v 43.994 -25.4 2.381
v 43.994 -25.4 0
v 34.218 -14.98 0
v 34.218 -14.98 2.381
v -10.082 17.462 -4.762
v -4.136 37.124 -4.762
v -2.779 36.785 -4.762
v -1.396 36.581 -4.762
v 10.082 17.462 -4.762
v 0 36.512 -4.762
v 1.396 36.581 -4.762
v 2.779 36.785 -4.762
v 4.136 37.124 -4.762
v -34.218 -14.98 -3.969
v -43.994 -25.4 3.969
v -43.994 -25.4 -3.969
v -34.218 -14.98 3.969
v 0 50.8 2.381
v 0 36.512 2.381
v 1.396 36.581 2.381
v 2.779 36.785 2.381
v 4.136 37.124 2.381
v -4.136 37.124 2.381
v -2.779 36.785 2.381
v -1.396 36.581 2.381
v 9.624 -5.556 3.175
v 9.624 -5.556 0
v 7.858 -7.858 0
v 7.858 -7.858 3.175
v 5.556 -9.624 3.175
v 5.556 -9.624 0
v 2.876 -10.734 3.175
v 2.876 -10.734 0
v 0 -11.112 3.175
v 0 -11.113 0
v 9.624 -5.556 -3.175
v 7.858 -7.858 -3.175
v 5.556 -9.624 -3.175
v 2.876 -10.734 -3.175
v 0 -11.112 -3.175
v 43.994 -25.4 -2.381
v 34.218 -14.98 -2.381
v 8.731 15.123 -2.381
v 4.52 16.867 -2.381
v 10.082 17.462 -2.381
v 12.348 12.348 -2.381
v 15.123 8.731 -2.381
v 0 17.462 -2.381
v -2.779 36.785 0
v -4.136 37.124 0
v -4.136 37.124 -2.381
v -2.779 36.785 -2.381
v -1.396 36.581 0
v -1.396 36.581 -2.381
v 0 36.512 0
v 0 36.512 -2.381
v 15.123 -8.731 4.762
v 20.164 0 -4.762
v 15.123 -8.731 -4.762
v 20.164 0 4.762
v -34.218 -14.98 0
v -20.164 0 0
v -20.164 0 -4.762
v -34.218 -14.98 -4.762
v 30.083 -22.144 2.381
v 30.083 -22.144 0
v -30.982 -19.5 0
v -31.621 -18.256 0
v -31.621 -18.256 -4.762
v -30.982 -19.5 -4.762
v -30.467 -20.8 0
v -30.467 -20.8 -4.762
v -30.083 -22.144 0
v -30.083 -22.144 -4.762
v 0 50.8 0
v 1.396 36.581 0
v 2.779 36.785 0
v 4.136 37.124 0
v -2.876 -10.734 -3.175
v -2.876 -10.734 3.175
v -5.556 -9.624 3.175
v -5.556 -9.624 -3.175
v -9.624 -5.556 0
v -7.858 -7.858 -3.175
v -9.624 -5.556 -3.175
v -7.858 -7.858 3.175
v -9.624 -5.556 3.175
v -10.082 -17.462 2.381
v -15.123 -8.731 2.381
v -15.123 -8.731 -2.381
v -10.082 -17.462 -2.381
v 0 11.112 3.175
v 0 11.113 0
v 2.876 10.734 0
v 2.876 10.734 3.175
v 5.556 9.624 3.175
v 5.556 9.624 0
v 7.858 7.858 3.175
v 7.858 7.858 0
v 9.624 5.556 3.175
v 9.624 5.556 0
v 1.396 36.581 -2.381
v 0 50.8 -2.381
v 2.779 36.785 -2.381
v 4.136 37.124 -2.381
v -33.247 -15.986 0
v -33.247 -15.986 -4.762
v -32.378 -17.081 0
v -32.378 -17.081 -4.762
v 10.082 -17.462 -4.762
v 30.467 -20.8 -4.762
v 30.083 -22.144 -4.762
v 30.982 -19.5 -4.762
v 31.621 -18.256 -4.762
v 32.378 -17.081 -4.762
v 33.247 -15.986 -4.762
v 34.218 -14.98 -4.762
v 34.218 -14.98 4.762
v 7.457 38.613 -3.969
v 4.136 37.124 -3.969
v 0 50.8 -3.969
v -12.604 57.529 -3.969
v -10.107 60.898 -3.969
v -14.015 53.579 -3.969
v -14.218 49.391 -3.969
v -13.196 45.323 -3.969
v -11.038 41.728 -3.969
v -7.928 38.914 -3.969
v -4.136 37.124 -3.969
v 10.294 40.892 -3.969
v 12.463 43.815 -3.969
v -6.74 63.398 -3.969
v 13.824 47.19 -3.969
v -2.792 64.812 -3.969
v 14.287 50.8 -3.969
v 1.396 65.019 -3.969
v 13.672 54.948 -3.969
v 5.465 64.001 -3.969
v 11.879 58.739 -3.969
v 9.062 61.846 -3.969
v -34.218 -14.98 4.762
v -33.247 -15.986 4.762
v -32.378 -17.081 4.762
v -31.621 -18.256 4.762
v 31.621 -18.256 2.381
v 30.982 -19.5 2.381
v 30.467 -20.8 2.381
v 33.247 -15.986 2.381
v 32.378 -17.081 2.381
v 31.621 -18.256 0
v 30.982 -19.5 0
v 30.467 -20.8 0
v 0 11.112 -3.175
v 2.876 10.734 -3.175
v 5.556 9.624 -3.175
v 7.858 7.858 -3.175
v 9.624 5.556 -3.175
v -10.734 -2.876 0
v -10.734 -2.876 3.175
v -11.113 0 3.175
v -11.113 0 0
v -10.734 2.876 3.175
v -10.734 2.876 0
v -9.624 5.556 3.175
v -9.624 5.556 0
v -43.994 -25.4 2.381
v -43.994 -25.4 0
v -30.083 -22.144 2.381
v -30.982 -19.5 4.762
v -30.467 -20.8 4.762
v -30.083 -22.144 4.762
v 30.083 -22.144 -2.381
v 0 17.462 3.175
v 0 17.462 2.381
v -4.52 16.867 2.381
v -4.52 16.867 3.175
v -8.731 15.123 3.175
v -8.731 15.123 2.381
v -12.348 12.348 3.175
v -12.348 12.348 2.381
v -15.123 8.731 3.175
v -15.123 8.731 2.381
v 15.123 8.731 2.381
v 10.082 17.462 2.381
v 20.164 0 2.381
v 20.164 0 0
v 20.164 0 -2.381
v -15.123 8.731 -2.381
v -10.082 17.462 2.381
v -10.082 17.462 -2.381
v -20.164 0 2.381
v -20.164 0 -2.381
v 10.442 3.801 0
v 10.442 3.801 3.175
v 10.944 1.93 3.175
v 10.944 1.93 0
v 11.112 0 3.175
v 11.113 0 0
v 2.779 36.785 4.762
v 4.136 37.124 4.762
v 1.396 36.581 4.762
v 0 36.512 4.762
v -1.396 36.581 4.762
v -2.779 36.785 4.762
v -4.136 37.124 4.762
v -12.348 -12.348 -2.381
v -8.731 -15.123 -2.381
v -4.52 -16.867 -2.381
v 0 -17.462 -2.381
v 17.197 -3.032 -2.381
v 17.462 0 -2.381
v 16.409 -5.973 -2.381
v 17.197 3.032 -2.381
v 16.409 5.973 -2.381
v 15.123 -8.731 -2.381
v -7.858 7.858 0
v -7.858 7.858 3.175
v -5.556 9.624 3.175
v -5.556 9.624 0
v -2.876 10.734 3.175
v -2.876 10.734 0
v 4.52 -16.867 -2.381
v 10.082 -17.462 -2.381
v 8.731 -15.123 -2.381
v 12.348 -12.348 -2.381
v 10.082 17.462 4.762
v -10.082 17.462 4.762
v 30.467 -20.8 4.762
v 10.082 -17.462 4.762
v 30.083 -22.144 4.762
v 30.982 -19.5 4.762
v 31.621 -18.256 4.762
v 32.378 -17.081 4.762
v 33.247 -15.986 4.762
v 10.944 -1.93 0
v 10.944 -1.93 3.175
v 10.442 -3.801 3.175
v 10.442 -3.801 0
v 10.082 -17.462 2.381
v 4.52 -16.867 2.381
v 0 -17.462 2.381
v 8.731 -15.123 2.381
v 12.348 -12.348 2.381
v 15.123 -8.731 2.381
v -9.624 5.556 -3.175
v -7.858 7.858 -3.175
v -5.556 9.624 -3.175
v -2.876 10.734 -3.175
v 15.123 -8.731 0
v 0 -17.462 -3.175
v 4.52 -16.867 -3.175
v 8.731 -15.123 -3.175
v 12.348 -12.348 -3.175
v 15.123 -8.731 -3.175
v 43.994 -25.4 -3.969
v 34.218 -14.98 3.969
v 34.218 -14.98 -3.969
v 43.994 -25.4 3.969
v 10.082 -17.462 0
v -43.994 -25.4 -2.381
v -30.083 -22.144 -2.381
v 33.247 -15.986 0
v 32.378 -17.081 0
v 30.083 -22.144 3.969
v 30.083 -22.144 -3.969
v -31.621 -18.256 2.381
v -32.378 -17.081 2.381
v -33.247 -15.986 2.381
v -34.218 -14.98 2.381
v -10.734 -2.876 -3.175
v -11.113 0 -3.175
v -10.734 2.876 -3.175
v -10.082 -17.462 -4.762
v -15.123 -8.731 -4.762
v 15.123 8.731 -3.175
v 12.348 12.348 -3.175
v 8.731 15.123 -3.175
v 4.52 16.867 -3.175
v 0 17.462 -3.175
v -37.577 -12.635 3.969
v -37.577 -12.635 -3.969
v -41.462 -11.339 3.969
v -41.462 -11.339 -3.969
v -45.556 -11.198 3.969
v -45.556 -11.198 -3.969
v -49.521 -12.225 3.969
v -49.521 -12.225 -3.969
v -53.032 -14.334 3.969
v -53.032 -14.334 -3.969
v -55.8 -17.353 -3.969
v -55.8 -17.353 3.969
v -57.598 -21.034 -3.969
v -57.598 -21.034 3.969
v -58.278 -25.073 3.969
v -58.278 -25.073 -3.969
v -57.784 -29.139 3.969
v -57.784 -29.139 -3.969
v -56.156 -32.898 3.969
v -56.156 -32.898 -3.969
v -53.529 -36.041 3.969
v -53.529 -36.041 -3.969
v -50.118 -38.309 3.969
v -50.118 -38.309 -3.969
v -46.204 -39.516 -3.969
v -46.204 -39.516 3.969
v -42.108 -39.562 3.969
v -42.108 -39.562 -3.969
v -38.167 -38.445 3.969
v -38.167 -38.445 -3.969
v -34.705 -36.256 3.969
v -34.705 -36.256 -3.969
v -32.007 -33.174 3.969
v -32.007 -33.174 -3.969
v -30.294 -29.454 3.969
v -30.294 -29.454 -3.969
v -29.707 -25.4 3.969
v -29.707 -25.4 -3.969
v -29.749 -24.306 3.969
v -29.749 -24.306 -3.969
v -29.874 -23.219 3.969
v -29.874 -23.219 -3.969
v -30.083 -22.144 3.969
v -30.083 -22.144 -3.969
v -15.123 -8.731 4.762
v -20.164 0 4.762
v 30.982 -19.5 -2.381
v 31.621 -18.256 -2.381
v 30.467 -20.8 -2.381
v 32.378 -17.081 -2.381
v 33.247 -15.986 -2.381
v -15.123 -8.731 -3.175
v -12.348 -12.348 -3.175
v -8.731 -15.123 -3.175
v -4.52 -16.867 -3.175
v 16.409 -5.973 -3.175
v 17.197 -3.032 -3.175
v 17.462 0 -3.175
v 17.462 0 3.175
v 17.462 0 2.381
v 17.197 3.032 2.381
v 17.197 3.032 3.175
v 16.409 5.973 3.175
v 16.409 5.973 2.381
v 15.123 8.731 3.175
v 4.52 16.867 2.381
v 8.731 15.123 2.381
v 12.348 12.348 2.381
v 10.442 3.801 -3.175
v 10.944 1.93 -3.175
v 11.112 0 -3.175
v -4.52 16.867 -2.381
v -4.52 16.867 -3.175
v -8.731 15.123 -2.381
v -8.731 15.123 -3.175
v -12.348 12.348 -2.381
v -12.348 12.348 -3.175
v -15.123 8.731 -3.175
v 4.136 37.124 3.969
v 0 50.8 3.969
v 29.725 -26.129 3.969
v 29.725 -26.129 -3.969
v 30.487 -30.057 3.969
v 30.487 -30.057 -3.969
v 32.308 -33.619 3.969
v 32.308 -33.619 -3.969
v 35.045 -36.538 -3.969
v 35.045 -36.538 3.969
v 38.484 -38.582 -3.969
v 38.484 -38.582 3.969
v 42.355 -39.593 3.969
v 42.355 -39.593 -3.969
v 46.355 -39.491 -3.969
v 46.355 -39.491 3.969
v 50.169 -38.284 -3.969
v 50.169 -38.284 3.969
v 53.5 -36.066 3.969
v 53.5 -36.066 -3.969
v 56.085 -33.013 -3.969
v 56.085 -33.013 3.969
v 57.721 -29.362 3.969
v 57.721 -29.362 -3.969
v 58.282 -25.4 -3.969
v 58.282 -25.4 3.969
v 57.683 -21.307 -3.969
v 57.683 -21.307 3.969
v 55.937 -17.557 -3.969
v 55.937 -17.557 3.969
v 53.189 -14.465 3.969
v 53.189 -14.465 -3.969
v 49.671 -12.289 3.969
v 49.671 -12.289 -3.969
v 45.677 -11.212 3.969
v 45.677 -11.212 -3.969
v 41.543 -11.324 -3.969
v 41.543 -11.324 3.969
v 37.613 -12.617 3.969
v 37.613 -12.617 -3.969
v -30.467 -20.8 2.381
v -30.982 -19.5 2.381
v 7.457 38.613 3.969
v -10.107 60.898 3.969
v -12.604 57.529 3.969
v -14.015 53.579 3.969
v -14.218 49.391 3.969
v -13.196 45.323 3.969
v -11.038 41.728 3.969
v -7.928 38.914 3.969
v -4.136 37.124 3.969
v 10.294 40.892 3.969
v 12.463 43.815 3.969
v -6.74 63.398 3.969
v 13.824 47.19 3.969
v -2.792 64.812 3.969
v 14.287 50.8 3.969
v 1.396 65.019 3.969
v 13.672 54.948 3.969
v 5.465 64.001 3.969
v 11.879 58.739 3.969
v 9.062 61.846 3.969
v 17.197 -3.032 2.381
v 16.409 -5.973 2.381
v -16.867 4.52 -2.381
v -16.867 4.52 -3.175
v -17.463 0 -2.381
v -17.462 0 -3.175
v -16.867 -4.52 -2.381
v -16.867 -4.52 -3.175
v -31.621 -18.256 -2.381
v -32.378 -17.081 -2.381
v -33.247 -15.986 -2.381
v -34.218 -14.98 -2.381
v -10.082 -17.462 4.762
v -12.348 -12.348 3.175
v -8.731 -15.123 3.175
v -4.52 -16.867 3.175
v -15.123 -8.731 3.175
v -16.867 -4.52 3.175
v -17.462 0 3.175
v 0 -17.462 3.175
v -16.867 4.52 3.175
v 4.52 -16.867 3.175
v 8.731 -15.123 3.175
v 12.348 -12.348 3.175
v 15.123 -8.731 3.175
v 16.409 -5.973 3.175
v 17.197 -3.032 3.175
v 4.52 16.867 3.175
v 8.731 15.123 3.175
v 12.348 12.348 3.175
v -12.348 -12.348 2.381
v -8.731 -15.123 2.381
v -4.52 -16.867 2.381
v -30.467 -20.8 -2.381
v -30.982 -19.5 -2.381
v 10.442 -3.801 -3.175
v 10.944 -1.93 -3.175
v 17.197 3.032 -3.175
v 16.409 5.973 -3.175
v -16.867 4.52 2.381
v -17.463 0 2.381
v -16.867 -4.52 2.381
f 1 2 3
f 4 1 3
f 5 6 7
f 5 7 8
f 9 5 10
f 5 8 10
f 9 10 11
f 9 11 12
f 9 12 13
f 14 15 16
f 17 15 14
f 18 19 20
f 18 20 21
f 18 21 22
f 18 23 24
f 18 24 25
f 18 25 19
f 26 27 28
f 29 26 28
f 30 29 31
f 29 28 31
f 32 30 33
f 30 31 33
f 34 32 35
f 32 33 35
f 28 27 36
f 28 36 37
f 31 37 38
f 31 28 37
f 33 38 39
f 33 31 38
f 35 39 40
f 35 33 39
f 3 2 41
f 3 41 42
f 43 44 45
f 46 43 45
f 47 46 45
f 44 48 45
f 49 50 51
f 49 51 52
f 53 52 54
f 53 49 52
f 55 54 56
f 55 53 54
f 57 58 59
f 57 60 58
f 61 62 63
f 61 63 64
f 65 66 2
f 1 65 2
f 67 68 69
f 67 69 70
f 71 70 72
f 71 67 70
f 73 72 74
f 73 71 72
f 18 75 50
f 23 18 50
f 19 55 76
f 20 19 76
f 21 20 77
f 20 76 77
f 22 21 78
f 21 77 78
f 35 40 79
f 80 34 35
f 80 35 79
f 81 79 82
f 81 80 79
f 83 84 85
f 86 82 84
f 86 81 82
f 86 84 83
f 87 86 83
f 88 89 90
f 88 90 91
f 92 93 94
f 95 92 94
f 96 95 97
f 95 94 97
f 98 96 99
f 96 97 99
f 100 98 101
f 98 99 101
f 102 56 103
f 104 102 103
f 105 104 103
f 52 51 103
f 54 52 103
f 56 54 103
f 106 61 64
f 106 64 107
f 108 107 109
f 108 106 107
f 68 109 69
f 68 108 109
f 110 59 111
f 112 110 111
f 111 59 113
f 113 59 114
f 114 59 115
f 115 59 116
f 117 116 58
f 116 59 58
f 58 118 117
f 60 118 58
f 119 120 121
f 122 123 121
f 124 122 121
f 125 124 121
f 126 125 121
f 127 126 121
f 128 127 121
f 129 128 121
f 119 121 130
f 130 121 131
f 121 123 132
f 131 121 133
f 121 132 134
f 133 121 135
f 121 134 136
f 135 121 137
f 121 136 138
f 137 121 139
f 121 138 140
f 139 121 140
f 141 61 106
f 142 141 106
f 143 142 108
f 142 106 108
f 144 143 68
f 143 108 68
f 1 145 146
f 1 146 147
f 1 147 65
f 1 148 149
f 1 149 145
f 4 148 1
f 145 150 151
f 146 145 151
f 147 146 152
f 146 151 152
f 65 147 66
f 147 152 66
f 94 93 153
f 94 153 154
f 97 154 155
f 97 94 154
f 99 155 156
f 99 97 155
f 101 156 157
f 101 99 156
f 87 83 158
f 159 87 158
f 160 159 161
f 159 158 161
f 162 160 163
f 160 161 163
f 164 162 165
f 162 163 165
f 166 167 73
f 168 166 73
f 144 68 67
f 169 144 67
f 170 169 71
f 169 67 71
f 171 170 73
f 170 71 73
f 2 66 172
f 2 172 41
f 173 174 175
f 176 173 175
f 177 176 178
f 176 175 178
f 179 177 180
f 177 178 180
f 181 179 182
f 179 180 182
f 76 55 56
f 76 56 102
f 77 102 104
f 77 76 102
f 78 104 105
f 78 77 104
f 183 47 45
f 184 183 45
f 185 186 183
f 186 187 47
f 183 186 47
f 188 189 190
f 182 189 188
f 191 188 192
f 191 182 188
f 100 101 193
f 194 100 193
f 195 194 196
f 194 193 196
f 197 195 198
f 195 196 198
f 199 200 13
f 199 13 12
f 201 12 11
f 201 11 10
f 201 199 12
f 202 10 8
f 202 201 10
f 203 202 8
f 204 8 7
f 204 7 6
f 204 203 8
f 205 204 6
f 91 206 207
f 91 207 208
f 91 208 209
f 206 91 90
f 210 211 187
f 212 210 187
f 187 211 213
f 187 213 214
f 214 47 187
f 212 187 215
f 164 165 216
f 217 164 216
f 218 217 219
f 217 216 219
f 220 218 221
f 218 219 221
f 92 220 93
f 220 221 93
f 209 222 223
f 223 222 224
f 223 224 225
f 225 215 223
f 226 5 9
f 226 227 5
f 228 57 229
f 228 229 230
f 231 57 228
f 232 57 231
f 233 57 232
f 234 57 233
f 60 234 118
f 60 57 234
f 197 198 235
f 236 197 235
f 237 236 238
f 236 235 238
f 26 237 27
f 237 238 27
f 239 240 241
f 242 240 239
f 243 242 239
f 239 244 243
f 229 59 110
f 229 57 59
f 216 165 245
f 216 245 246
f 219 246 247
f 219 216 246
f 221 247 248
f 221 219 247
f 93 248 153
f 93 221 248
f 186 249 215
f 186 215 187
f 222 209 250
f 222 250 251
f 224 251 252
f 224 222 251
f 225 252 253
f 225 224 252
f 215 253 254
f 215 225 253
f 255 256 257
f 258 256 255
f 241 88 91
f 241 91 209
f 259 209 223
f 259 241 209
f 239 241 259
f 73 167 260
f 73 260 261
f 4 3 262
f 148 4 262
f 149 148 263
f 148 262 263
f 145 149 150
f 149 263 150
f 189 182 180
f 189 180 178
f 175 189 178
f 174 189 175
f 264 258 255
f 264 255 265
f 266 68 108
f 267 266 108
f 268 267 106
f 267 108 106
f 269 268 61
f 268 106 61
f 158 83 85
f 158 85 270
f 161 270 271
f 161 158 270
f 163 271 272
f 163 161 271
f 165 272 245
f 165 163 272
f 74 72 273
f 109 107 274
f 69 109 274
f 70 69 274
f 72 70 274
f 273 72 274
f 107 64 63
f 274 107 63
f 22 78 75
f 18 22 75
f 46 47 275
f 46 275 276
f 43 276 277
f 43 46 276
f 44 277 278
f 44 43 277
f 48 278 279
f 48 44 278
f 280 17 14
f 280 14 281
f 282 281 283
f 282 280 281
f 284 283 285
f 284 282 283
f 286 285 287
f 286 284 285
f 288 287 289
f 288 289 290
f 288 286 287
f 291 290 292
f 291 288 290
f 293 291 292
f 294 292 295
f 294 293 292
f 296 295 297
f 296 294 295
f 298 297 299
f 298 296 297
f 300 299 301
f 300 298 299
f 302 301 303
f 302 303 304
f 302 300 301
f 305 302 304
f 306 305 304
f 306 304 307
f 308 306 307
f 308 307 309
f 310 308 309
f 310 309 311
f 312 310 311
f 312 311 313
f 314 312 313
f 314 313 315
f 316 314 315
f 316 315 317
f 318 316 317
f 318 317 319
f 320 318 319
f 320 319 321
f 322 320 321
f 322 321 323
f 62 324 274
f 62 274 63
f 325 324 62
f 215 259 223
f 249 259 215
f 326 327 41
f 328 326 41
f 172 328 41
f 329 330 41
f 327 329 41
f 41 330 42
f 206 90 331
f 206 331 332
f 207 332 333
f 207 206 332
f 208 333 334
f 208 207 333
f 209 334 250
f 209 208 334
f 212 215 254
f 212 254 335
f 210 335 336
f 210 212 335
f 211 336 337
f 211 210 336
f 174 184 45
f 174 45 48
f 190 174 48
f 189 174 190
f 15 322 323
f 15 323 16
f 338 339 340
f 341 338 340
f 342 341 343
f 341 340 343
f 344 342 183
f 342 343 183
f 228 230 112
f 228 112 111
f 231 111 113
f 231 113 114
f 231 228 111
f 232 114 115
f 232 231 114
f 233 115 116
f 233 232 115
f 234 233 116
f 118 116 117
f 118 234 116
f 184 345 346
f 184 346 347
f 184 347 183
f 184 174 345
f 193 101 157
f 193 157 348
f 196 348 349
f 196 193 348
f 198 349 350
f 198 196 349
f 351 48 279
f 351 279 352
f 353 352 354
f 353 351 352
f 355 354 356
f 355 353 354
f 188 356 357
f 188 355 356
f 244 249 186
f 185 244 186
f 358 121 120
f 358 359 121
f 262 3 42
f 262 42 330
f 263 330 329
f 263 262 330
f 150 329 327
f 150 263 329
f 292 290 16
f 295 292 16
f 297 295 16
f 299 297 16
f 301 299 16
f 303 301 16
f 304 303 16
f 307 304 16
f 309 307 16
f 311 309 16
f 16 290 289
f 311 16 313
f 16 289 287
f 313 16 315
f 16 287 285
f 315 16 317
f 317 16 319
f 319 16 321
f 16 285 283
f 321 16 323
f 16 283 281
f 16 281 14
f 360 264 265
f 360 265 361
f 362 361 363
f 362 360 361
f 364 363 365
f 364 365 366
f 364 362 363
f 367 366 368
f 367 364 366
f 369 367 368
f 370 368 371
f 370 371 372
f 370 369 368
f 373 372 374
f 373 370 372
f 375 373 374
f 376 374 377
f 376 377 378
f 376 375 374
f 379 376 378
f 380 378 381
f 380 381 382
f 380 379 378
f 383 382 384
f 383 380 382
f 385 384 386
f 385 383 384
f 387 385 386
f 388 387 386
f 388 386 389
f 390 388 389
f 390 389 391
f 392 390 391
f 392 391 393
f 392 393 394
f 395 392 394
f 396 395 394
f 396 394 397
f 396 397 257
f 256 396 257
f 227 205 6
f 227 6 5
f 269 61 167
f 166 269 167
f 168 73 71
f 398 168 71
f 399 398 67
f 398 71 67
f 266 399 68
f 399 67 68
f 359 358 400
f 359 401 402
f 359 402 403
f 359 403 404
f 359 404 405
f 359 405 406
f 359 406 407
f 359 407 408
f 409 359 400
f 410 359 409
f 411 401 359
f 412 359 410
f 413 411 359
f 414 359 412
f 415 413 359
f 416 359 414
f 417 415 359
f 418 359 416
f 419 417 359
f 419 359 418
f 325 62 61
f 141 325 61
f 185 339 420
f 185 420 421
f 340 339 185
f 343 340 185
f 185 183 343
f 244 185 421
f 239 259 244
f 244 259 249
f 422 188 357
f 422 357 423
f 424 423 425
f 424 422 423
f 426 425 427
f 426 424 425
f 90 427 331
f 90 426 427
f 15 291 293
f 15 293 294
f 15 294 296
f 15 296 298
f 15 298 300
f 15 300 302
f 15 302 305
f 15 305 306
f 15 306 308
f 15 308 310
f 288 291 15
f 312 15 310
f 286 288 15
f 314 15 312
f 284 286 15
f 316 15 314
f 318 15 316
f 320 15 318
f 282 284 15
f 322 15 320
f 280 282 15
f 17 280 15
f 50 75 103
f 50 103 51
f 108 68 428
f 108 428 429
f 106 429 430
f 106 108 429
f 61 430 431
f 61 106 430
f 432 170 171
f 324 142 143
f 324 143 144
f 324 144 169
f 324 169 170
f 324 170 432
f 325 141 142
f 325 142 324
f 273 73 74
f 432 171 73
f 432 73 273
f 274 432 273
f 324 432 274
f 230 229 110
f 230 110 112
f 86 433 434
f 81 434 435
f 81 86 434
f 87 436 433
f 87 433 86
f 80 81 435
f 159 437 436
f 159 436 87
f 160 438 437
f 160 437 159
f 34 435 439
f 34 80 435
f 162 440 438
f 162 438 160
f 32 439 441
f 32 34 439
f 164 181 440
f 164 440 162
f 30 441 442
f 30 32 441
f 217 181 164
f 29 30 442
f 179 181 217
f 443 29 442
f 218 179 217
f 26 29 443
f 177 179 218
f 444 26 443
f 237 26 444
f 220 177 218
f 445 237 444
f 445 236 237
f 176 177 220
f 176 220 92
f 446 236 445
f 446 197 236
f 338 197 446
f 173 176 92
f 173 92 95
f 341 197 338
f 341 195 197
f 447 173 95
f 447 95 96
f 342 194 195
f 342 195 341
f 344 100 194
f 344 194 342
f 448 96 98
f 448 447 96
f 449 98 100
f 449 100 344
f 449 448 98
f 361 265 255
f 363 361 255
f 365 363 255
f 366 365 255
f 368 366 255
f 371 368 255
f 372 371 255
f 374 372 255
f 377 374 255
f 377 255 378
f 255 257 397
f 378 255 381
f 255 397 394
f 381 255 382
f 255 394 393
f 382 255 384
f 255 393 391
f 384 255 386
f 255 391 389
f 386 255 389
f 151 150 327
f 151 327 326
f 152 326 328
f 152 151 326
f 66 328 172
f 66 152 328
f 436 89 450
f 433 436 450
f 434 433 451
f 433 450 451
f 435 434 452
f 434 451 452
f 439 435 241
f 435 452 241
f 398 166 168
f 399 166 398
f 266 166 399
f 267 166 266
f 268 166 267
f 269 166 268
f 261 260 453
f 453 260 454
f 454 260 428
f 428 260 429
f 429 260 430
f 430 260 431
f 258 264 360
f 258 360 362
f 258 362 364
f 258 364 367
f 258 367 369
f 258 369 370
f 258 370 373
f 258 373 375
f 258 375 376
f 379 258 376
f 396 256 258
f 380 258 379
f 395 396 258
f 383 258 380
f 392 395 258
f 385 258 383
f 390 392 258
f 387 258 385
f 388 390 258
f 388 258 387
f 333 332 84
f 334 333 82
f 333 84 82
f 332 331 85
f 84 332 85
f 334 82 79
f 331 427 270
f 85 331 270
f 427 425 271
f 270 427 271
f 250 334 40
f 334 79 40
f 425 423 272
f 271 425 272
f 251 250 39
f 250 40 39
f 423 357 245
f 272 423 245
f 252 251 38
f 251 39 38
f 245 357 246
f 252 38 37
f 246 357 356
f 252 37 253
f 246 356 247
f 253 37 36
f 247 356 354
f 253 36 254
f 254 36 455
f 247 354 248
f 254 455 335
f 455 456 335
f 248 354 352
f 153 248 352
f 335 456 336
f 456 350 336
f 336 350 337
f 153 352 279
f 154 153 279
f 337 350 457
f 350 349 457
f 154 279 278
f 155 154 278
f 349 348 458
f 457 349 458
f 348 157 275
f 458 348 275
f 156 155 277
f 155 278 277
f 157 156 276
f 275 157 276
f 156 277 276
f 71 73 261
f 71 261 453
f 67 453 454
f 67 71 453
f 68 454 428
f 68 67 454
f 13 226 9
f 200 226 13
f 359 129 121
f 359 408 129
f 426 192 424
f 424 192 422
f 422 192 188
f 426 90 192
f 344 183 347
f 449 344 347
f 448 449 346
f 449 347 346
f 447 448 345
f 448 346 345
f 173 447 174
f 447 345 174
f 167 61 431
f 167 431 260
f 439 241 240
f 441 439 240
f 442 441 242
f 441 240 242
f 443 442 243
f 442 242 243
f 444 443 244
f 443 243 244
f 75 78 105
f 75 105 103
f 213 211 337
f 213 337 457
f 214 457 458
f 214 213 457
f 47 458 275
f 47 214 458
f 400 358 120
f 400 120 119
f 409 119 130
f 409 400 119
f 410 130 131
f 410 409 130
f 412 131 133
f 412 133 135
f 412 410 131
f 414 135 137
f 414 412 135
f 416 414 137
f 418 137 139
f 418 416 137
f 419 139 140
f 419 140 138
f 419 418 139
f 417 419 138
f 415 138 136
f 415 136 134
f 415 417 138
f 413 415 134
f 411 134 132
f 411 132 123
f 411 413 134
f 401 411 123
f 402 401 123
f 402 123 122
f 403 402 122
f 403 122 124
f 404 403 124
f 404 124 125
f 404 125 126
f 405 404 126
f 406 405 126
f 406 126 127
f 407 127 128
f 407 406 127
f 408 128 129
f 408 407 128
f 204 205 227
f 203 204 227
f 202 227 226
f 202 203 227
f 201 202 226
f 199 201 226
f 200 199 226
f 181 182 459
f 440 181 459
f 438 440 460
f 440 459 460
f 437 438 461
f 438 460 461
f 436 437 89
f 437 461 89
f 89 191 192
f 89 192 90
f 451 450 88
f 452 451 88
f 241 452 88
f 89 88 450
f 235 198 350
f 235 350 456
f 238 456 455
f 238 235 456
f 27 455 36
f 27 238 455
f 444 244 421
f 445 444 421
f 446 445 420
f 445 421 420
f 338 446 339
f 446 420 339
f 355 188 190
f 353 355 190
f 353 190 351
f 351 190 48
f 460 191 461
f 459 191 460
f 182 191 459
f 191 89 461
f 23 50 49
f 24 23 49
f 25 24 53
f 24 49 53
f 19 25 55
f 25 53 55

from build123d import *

# Parameters (mm, degrees)
F1_DEPTH      = 3.175
F1_DEPTH_BACK = 3.175
F2_DEPTH      = 2.38125
F2_DEPTH_BACK = 2.38125
F3_DEPTH      = 4.7625
F3_DEPTH_BACK = 4.7625
F4_DEPTH      = 3.96875
F4_DEPTH_BACK = 3.96875
F5_DEPTH      = 2.38125
F5_DEPTH_BACK = 2.38125


# Not quite as in the source:
# - a length typed as a fraction of an inch, garbled in the dataset ("3 / 203.2 mm" for 3/8 in), is restored


with BuildPart() as f1:
    # F0 (on Top) → F1 (new body, two sides)
    with BuildSketch(Plane.XY) as f1_sk:
        with BuildLine():
            Line((0, -17.4625), (0, -11.1125))
            ThreePointArc((0, -11.1125), (-5.55625, -9.6237072996), (-9.6237072996, -5.55625))
            Line((-9.6237072996, -5.55625), (-15.1229686136, -8.73125))
            ThreePointArc((-15.1229686303, -8.731249971), (-8.7312500094, -15.1229686082), (1.18e-08, -17.4625))
        make_face()
        with BuildLine():
            ThreePointArc((-9.6237072996, 5.55625), (-5.55625, 9.6237072996), (0, 11.1125))
            Line((0, 11.1125), (0, 17.4625))
            ThreePointArc((0, 17.4625), (-8.7312499932, 15.1229686175), (-15.1229686057, 8.7312500136))
            Line((-15.1229686136, 8.73125), (-9.6237072996, 5.55625))
        make_face()
        with BuildLine():
            ThreePointArc((-9.6237072996, -5.55625), (-11.1125, 0), (-9.6237072996, 5.55625))
            Line((-9.6237072996, 5.55625), (-15.1229686136, 8.73125))
            ThreePointArc((-15.1229686057, 8.7312500136), (-17.4625, 2.46e-08), (-15.1229686303, -8.731249971))
            Line((-15.1229686136, -8.73125), (-9.6237072996, -5.55625))
        make_face()
        with BuildLine():
            ThreePointArc((0, 11.1125), (5.55625, 9.6237072996), (9.6237072996, 5.55625))
            Line((9.6237072996, 5.55625), (15.1229686136, 8.73125))
            ThreePointArc((15.1229686421, 8.7312499507), (8.7312500247, 15.1229685993), (0, 17.4625))
            Line((0, 17.4625), (0, 11.1125))
        make_face()
        with BuildLine():
            ThreePointArc((9.6237072996, 5.55625), (10.7338507446, 2.8761266387), (11.1125, 0))
            ThreePointArc((11.1125, 0), (10.7338507446, -2.8761266387), (9.6237072996, -5.55625))
            Line((9.6237072996, -5.55625), (15.1229686136, -8.73125))
            ThreePointArc((15.1229686466, -8.7312499429), (16.8674797501, -4.5196275433), (17.4625, 0))
            ThreePointArc((17.4625, 0), (16.8674797489, 4.5196275476), (15.1229686421, 8.7312499507))
            Line((15.1229686136, 8.73125), (9.6237072996, 5.55625))
        make_face()
        with BuildLine():
            Line((15.1229686136, -8.73125), (9.6237072996, -5.55625))
            ThreePointArc((9.6237072996, -5.55625), (5.55625, -9.6237072996), (0, -11.1125))
            Line((0, -11.1125), (0, -17.4625))
            ThreePointArc((1.18e-08, -17.4625), (8.7312500336, -15.1229685942), (15.1229686466, -8.7312499429))
        make_face()
    extrude(amount=-F1_DEPTH)
    extrude(f1_sk.sketch, amount=F1_DEPTH_BACK)

    # F0 (on Top) → F2 (join, two sides)
    with BuildSketch(Plane.XY) as f2_sk:
        with BuildLine():
            ThreePointArc((-15.1229686303, -8.731249971), (-17.4625, 2.46e-08), (-15.1229686057, 8.7312500136))
            Line((-15.1229686057, 8.7312500136), (-20.1639581514, 0))
            Line((-20.1639581514, 0), (-15.1229686303, -8.731249971))
        make_face()
        with BuildLine():
            Line((-10.0819790757, -17.4625), (1.18e-08, -17.4625))
            ThreePointArc((1.18e-08, -17.4625), (-8.7312500094, -15.1229686082), (-15.1229686303, -8.731249971))
            Line((-15.1229686303, -8.731249971), (-10.0819790757, -17.4625))
        make_face()
        with BuildLine():
            ThreePointArc((-15.1229686057, 8.7312500136), (-8.7312499932, 15.1229686175), (0, 17.4625))
            Line((0, 17.4625), (-10.0819790757, 17.4625))
            Line((-10.0819790757, 17.4625), (-15.1229686057, 8.7312500136))
        make_face()
        with BuildLine():
            ThreePointArc((0, 17.4625), (8.7312500247, 15.1229685993), (15.1229686421, 8.7312499507))
            Line((15.1229686421, 8.7312499507), (10.0819790757, 17.4625))
            Line((10.0819790757, 17.4625), (0, 17.4625))
        make_face()
        with BuildLine():
            Line((10.0819790757, -17.4625), (15.1229686466, -8.7312499429))
            ThreePointArc((15.1229686466, -8.7312499429), (8.7312500336, -15.1229685942), (1.18e-08, -17.4625))
            Line((1.18e-08, -17.4625), (10.0819790757, -17.4625))
        make_face()
        with BuildLine():
            Line((20.1639581514, 0), (15.1229686421, 8.7312499507))
            ThreePointArc((15.1229686421, 8.7312499507), (16.8674797489, 4.5196275476), (17.4625, 0))
            ThreePointArc((17.4625, 0), (16.8674797501, -4.5196275433), (15.1229686466, -8.7312499429))
            Line((15.1229686466, -8.7312499429), (20.1639581514, 0))
        make_face()
    extrude(amount=F2_DEPTH)
    extrude(f2_sk.sketch, amount=-F2_DEPTH_BACK)


with BuildPart() as f3:
    # F0 (on Top) → F3 (new body, two sides)
    with BuildSketch(Plane.XY) as f3_sk:
        with BuildLine():
            Line((31.6207525557, -18.25625), (15.1229686136, -8.73125))
            Line((15.1229686466, -8.7312499429), (10.0819790757, -17.4625))
            Line((10.0819790757, -17.4625), (30.0825773544, -22.1438584325))
            ThreePointArc((30.0825773544, -22.1438584325), (30.7086953597, -20.1434867173), (31.6207525557, -18.25625))
        make_face()
        with BuildLine():
            Line((20.1639581514, 0), (15.1229686466, -8.7312499429))
            Line((15.1229686136, -8.73125), (31.6207525557, -18.25625))
            ThreePointArc((31.6207525557, -18.25625), (32.7991188978, -16.52276694), (34.2184326175, -14.9803469839))
            Line((34.2184326175, -14.9803469839), (20.1639581514, 0))
        make_face()
    extrude(amount=F3_DEPTH)
    extrude(f3_sk.sketch, amount=-F3_DEPTH_BACK)


with BuildPart() as f3b:
    # F0 (on Top) → F3, piece 2 (new body, two sides)
    with BuildSketch(Plane.XY) as f3_2_sk:
        with BuildLine():
            Line((0, 36.5125), (0, 17.4625))
            Line((0, 17.4625), (10.0819790757, 17.4625))
            Line((10.0819790757, 17.4625), (4.1358552632, 37.1242054164))
            ThreePointArc((4.1358552632, 37.1242054164), (2.0904235381, 36.6662536572), (0, 36.5125))
        make_face()
        with BuildLine():
            Line((-10.0819790757, 17.4625), (0, 17.4625))
            Line((0, 17.4625), (0, 36.5125))
            ThreePointArc((0, 36.5125), (-2.0904235381, 36.6662536572), (-4.1358552632, 37.1242054164))
            Line((-4.1358552632, 37.1242054164), (-10.0819790757, 17.4625))
        make_face()
    extrude(amount=F3_DEPTH)
    extrude(f3_2_sk.sketch, amount=-F3_DEPTH_BACK)


with BuildPart() as f3c:
    # F0 (on Top) → F3, piece 3 (new body, two sides)
    with BuildSketch(Plane.XY) as f3_3_sk:
        with BuildLine():
            Line((-10.0819790757, -17.4625), (-15.1229686303, -8.731249971))
            Line((-15.1229686136, -8.73125), (-31.6207525557, -18.25625))
            ThreePointArc((-31.6207525557, -18.25625), (-30.7086953597, -20.1434867173), (-30.0825773544, -22.1438584325))
            Line((-30.0825773544, -22.1438584325), (-10.0819790757, -17.4625))
        make_face()
        with BuildLine():
            Line((-31.6207525557, -18.25625), (-15.1229686136, -8.73125))
            Line((-15.1229686303, -8.731249971), (-20.1639581514, 0))
            Line((-20.1639581514, 0), (-34.2184326175, -14.9803469839))
            ThreePointArc((-34.2184326175, -14.9803469839), (-32.7991188978, -16.52276694), (-31.6207525557, -18.25625))
        make_face()
    extrude(amount=F3_DEPTH)
    extrude(f3_3_sk.sketch, amount=-F3_DEPTH_BACK)


with BuildPart() as f4:
    # F0 (on Top) → F4 (new body, two sides)
    with BuildSketch(Plane.XY) as f4_sk:
        with BuildLine():
            Line((0, 50.8), (4.1358552632, 37.1242054164))
            ThreePointArc((4.1358552632, 37.1242054164), (11.4722205419, 42.2840847768), (14.2875, 50.8))
            ThreePointArc((14.2875, 50.8), (-8.5159152232, 62.2722205419), (-4.1358552632, 37.1242054164))
            Line((-4.1358552632, 37.1242054164), (0, 50.8))
        make_face()
    extrude(amount=F4_DEPTH)
    extrude(f4_sk.sketch, amount=-F4_DEPTH_BACK)


with BuildPart() as f4b:
    # F0 (on Top) → F4, piece 2 (new body, two sides)
    with BuildSketch(Plane.XY) as f4_2_sk:
        with BuildLine():
            ThreePointArc((-29.7065905122, -25.4), (-29.8008984736, -23.7611113512), (-30.0825773544, -22.1438584325))
            Line((-30.0825773544, -22.1438584325), (-43.9940905122, -25.4))
            Line((-43.9940905122, -25.4), (-34.2184326175, -14.9803469839))
            ThreePointArc((-34.2184326175, -14.9803469839), (-57.105199703, -31.0772768155), (-29.7065905122, -25.4))
        make_face()
    extrude(amount=F4_DEPTH)
    extrude(f4_2_sk.sketch, amount=-F4_DEPTH_BACK)


with BuildPart() as f4c:
    # F0 (on Top) → F4, piece 3 (new body, two sides)
    with BuildSketch(Plane.XY) as f4_3_sk:
        with BuildLine():
            ThreePointArc((58.2815905122, -25.4), (49.6713673277, -12.2888908093), (34.2184326175, -14.9803469839))
            Line((34.2184326175, -14.9803469839), (43.9940905122, -25.4))
            Line((43.9940905122, -25.4), (30.0825773544, -22.1438584325))
            ThreePointArc((30.0825773544, -22.1438584325), (42.3552018634, -39.5931920387), (58.2815905122, -25.4))
        make_face()
    extrude(amount=F4_DEPTH)
    extrude(f4_3_sk.sketch, amount=-F4_DEPTH_BACK)


with BuildPart() as f5:
    # F0 (on Top) → F5 (new body, two sides)
    with BuildSketch(Plane.XY) as f5_sk:
        with BuildLine():
            Line((43.9940905122, -25.4), (31.6207525557, -18.25625))
            ThreePointArc((31.6207525557, -18.25625), (30.7086953597, -20.1434867173), (30.0825773544, -22.1438584325))
            Line((30.0825773544, -22.1438584325), (43.9940905122, -25.4))
        make_face()
        with BuildLine():
            ThreePointArc((34.2184326175, -14.9803469839), (32.7991188978, -16.52276694), (31.6207525557, -18.25625))
            Line((31.6207525557, -18.25625), (43.9940905122, -25.4))
            Line((43.9940905122, -25.4), (34.2184326175, -14.9803469839))
        make_face()
    extrude(amount=F5_DEPTH)
    extrude(f5_sk.sketch, amount=-F5_DEPTH_BACK)


with BuildPart() as f5b:
    # F0 (on Top) → F5, piece 2 (new body, two sides)
    with BuildSketch(Plane.XY) as f5_2_sk:
        with BuildLine():
            Line((0, 50.8), (0, 36.5125))
            ThreePointArc((0, 36.5125), (2.0904235381, 36.6662536572), (4.1358552632, 37.1242054164))
            Line((4.1358552632, 37.1242054164), (0, 50.8))
        make_face()
        with BuildLine():
            ThreePointArc((-4.1358552632, 37.1242054164), (-2.0904235381, 36.6662536572), (0, 36.5125))
            Line((0, 36.5125), (0, 50.8))
            Line((0, 50.8), (-4.1358552632, 37.1242054164))
        make_face()
    extrude(amount=F5_DEPTH)
    extrude(f5_2_sk.sketch, amount=-F5_DEPTH_BACK)


with BuildPart() as f5c:
    # F0 (on Top) → F5, piece 3 (new body, two sides)
    with BuildSketch(Plane.XY) as f5_3_sk:
        with BuildLine():
            Line((-43.9940905122, -25.4), (-31.6207525557, -18.25625))
            ThreePointArc((-31.6207525557, -18.25625), (-32.7991188978, -16.52276694), (-34.2184326175, -14.9803469839))
            Line((-34.2184326175, -14.9803469839), (-43.9940905122, -25.4))
        make_face()
        with BuildLine():
            ThreePointArc((-30.0825773544, -22.1438584325), (-30.7086953597, -20.1434867173), (-31.6207525557, -18.25625))
            Line((-31.6207525557, -18.25625), (-43.9940905122, -25.4))
            Line((-43.9940905122, -25.4), (-30.0825773544, -22.1438584325))
        make_face()
    extrude(amount=F5_DEPTH)
    extrude(f5_3_sk.sketch, amount=-F5_DEPTH_BACK)


solid = Compound([f1.part, f3.part, f3b.part, f3c.part, f4.part, f4b.part, f4c.part, f5.part, f5b.part, f5c.part])
